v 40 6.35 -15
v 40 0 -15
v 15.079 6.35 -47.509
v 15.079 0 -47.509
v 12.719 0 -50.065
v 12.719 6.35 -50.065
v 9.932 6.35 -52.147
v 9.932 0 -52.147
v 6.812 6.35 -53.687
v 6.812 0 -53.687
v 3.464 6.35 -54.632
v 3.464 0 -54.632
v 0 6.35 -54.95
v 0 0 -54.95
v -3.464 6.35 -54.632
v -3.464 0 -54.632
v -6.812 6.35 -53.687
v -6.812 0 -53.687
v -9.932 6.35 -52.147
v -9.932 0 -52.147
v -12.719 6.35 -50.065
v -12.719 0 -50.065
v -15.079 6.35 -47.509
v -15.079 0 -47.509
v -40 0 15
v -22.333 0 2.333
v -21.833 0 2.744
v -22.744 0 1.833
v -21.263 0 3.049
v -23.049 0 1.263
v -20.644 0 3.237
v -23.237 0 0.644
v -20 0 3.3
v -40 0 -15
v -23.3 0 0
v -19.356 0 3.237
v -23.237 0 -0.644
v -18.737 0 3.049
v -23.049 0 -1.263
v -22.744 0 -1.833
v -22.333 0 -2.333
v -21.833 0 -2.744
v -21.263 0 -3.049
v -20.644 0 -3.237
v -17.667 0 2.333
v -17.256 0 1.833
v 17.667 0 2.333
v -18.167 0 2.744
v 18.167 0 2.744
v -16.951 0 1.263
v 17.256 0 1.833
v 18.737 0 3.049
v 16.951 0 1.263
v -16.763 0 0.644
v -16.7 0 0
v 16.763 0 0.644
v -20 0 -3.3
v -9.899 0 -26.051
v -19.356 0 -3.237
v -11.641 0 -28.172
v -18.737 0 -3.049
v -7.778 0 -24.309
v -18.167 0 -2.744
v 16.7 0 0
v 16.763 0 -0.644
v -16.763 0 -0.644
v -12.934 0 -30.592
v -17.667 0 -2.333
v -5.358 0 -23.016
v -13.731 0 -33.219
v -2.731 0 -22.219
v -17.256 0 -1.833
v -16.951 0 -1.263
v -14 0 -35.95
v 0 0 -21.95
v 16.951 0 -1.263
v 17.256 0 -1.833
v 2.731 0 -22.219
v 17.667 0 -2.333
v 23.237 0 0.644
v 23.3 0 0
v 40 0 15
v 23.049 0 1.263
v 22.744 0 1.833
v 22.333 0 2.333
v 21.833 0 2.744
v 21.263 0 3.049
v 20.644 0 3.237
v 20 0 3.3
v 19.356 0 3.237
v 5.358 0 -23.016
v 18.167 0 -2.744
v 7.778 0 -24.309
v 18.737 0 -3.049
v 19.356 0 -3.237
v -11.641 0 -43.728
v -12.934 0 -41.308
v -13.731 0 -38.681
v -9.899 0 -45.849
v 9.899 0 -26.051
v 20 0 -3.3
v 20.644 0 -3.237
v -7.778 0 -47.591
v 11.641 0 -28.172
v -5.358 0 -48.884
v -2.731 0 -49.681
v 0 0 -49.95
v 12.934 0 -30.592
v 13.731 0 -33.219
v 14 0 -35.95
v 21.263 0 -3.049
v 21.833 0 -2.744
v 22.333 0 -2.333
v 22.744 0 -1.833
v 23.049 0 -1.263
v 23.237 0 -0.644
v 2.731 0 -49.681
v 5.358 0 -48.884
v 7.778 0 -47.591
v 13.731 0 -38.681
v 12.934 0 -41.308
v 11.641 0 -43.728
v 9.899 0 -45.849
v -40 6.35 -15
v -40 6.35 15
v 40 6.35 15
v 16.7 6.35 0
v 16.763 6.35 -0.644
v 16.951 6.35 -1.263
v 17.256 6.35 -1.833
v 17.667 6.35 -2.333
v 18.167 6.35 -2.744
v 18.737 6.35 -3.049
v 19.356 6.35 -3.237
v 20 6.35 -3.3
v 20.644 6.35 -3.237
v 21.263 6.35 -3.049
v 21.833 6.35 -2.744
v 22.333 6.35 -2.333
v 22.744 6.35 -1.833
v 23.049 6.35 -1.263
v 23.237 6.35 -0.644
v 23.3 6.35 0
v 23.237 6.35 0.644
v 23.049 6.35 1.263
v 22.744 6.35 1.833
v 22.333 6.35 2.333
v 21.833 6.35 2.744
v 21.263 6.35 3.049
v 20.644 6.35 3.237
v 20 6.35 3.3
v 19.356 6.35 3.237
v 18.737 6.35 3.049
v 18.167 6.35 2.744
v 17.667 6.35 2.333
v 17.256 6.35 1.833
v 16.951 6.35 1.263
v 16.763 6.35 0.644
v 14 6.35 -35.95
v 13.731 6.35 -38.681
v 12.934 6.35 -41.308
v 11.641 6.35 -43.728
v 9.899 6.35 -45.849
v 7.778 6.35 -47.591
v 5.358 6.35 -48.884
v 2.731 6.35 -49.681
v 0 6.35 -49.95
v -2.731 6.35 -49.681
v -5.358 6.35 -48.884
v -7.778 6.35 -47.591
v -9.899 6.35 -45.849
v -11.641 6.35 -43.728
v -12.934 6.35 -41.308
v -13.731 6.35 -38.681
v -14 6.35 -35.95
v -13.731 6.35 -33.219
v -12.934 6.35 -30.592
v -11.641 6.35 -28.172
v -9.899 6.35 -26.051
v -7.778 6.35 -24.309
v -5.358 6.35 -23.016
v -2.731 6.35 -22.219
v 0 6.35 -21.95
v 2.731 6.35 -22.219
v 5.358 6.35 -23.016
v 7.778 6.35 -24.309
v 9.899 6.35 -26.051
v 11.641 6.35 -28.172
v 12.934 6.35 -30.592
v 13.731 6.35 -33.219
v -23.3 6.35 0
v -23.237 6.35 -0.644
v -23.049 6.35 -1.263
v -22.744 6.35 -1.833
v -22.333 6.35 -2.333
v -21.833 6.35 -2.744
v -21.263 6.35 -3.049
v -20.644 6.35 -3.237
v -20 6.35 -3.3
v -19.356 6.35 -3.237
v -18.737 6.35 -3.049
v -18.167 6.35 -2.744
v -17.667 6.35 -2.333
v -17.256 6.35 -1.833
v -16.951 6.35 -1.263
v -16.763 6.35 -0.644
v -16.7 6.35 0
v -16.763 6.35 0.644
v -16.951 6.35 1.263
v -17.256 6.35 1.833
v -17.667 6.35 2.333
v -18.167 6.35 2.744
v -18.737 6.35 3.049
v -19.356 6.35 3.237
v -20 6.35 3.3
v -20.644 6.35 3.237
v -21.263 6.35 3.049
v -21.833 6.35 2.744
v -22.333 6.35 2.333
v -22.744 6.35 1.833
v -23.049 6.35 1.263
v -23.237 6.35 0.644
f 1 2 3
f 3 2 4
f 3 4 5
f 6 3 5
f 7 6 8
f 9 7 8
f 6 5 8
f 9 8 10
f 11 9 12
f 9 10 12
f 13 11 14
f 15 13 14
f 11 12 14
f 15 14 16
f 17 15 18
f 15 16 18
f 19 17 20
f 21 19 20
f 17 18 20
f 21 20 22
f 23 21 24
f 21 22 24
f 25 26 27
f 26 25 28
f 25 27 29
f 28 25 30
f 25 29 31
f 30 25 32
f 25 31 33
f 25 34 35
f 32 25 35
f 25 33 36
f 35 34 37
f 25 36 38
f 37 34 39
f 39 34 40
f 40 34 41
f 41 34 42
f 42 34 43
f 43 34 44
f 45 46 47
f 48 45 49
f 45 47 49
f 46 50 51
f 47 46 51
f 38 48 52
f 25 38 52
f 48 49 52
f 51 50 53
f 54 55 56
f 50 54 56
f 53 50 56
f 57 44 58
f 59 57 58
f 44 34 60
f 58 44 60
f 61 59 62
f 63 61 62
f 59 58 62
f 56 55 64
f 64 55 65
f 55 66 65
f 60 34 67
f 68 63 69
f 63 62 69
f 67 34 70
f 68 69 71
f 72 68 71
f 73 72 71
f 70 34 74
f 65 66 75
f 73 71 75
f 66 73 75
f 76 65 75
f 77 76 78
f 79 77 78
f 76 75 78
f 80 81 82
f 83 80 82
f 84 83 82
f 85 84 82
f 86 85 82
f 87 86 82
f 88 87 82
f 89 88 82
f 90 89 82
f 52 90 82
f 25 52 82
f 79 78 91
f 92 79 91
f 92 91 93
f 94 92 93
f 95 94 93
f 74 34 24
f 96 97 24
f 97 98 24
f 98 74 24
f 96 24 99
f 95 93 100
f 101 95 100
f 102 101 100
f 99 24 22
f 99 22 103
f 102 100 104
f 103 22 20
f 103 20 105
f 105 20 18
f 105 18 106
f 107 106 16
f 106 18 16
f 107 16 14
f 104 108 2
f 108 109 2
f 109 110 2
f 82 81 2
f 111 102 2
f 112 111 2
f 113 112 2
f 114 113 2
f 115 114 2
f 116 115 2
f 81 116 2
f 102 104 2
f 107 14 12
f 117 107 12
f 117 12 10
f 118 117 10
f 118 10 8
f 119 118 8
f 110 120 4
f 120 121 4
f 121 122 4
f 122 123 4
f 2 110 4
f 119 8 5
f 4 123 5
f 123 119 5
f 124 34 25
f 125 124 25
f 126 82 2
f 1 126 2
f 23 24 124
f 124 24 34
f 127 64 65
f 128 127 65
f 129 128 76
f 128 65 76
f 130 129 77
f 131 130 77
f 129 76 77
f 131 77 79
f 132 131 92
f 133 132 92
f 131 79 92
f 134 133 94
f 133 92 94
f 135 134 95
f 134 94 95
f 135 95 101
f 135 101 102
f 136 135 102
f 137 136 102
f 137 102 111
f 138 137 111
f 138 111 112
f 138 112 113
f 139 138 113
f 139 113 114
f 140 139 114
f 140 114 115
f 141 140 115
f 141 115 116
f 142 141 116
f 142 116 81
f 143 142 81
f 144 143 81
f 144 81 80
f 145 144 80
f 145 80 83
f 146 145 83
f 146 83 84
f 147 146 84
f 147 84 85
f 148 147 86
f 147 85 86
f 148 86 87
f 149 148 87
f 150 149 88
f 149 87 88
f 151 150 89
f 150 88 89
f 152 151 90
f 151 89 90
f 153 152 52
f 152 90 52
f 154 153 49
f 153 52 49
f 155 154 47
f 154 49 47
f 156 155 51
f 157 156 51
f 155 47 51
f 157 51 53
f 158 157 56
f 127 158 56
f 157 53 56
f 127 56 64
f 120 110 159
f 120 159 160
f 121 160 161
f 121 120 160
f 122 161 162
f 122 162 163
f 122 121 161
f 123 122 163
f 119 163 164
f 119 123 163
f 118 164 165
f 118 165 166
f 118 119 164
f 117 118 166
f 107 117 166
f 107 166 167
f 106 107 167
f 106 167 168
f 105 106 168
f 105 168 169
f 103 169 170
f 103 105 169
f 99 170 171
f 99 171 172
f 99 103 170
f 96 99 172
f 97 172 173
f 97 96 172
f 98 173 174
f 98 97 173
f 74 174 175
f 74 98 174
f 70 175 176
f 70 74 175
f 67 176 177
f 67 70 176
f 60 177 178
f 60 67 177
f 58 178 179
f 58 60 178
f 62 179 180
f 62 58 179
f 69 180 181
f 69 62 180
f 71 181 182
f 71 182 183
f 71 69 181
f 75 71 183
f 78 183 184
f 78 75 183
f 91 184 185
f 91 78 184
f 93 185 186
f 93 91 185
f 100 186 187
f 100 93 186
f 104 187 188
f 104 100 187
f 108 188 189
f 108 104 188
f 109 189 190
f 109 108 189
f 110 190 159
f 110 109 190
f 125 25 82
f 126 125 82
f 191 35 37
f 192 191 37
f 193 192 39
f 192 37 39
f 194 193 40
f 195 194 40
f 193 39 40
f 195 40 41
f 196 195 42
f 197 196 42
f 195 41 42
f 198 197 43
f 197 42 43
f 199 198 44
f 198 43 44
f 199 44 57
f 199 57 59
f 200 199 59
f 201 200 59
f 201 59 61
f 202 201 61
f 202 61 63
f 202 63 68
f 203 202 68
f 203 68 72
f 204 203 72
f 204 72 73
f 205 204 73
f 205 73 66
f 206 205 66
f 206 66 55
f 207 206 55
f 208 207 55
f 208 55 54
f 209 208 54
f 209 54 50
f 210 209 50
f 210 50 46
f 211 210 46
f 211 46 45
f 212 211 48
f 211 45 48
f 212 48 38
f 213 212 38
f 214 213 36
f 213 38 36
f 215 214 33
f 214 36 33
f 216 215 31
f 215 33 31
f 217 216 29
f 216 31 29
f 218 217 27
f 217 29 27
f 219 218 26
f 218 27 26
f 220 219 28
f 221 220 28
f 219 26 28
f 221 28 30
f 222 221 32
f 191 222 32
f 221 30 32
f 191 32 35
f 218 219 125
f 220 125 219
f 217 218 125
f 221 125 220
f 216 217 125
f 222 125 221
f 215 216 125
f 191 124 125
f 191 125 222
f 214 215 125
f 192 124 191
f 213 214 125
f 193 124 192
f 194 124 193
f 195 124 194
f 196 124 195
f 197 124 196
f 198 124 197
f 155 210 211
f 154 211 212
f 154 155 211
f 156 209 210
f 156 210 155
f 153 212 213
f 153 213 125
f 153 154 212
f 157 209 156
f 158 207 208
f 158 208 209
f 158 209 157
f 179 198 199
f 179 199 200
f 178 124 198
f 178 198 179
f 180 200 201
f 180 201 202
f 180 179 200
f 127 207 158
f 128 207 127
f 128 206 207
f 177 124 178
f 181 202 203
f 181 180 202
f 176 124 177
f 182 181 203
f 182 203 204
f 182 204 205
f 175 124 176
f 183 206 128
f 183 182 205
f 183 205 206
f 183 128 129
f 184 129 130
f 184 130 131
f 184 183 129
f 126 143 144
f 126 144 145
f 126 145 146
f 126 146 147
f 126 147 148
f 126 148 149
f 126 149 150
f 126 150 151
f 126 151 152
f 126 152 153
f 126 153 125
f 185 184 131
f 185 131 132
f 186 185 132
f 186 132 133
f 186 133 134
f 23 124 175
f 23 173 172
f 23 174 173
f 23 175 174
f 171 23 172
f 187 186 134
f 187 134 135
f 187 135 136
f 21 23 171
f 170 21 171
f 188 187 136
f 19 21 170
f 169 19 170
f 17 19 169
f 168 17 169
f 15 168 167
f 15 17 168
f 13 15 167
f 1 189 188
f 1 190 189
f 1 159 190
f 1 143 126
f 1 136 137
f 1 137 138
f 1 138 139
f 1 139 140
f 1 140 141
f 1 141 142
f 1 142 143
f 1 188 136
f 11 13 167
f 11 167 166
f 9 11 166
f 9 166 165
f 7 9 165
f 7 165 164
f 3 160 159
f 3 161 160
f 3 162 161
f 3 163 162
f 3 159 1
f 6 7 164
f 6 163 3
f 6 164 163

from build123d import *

# Parameters (mm, degrees)
SKETCH1_R            = 14
BOSS_EXTRUDE1_DEPTH  = 6.35
M6_CLEARANCE_HOLE1_D = 6.6


with BuildPart() as part:
    # Sketch1 → Boss-Extrude1 (new body)
    with BuildSketch(Plane(origin=(0, 0, 0), x_dir=(1, 0, 0), z_dir=(0, 1, 0))):
        with BuildLine():
            Line((40, -15), (40, 15))
            Line((40, 15), (15.079194307, 47.509320873))
            ThreePointArc((15.079194307, 47.509320873), (0, 54.95), (-15.079194307, 47.509320873))
            Line((-15.079194307, 47.509320873), (-40, 15))
            Line((-40, 15), (-40, -15))
            Line((-40, -15), (40, -15))
        make_face()
        with Locations((0, 35.95)):
            Circle(SKETCH1_R, mode=Mode.SUBTRACT)
    extrude(amount=BOSS_EXTRUDE1_DEPTH)

    # M6 Clearance Hole1 (through all)
    with Locations(Plane(origin=(0, 6.35, 0), x_dir=(1, 0, 0), z_dir=(0, 1, 0))):
        with Locations((-20, 0), (20, 0)):
            Hole(M6_CLEARANCE_HOLE1_D / 2)


solid = part.part
